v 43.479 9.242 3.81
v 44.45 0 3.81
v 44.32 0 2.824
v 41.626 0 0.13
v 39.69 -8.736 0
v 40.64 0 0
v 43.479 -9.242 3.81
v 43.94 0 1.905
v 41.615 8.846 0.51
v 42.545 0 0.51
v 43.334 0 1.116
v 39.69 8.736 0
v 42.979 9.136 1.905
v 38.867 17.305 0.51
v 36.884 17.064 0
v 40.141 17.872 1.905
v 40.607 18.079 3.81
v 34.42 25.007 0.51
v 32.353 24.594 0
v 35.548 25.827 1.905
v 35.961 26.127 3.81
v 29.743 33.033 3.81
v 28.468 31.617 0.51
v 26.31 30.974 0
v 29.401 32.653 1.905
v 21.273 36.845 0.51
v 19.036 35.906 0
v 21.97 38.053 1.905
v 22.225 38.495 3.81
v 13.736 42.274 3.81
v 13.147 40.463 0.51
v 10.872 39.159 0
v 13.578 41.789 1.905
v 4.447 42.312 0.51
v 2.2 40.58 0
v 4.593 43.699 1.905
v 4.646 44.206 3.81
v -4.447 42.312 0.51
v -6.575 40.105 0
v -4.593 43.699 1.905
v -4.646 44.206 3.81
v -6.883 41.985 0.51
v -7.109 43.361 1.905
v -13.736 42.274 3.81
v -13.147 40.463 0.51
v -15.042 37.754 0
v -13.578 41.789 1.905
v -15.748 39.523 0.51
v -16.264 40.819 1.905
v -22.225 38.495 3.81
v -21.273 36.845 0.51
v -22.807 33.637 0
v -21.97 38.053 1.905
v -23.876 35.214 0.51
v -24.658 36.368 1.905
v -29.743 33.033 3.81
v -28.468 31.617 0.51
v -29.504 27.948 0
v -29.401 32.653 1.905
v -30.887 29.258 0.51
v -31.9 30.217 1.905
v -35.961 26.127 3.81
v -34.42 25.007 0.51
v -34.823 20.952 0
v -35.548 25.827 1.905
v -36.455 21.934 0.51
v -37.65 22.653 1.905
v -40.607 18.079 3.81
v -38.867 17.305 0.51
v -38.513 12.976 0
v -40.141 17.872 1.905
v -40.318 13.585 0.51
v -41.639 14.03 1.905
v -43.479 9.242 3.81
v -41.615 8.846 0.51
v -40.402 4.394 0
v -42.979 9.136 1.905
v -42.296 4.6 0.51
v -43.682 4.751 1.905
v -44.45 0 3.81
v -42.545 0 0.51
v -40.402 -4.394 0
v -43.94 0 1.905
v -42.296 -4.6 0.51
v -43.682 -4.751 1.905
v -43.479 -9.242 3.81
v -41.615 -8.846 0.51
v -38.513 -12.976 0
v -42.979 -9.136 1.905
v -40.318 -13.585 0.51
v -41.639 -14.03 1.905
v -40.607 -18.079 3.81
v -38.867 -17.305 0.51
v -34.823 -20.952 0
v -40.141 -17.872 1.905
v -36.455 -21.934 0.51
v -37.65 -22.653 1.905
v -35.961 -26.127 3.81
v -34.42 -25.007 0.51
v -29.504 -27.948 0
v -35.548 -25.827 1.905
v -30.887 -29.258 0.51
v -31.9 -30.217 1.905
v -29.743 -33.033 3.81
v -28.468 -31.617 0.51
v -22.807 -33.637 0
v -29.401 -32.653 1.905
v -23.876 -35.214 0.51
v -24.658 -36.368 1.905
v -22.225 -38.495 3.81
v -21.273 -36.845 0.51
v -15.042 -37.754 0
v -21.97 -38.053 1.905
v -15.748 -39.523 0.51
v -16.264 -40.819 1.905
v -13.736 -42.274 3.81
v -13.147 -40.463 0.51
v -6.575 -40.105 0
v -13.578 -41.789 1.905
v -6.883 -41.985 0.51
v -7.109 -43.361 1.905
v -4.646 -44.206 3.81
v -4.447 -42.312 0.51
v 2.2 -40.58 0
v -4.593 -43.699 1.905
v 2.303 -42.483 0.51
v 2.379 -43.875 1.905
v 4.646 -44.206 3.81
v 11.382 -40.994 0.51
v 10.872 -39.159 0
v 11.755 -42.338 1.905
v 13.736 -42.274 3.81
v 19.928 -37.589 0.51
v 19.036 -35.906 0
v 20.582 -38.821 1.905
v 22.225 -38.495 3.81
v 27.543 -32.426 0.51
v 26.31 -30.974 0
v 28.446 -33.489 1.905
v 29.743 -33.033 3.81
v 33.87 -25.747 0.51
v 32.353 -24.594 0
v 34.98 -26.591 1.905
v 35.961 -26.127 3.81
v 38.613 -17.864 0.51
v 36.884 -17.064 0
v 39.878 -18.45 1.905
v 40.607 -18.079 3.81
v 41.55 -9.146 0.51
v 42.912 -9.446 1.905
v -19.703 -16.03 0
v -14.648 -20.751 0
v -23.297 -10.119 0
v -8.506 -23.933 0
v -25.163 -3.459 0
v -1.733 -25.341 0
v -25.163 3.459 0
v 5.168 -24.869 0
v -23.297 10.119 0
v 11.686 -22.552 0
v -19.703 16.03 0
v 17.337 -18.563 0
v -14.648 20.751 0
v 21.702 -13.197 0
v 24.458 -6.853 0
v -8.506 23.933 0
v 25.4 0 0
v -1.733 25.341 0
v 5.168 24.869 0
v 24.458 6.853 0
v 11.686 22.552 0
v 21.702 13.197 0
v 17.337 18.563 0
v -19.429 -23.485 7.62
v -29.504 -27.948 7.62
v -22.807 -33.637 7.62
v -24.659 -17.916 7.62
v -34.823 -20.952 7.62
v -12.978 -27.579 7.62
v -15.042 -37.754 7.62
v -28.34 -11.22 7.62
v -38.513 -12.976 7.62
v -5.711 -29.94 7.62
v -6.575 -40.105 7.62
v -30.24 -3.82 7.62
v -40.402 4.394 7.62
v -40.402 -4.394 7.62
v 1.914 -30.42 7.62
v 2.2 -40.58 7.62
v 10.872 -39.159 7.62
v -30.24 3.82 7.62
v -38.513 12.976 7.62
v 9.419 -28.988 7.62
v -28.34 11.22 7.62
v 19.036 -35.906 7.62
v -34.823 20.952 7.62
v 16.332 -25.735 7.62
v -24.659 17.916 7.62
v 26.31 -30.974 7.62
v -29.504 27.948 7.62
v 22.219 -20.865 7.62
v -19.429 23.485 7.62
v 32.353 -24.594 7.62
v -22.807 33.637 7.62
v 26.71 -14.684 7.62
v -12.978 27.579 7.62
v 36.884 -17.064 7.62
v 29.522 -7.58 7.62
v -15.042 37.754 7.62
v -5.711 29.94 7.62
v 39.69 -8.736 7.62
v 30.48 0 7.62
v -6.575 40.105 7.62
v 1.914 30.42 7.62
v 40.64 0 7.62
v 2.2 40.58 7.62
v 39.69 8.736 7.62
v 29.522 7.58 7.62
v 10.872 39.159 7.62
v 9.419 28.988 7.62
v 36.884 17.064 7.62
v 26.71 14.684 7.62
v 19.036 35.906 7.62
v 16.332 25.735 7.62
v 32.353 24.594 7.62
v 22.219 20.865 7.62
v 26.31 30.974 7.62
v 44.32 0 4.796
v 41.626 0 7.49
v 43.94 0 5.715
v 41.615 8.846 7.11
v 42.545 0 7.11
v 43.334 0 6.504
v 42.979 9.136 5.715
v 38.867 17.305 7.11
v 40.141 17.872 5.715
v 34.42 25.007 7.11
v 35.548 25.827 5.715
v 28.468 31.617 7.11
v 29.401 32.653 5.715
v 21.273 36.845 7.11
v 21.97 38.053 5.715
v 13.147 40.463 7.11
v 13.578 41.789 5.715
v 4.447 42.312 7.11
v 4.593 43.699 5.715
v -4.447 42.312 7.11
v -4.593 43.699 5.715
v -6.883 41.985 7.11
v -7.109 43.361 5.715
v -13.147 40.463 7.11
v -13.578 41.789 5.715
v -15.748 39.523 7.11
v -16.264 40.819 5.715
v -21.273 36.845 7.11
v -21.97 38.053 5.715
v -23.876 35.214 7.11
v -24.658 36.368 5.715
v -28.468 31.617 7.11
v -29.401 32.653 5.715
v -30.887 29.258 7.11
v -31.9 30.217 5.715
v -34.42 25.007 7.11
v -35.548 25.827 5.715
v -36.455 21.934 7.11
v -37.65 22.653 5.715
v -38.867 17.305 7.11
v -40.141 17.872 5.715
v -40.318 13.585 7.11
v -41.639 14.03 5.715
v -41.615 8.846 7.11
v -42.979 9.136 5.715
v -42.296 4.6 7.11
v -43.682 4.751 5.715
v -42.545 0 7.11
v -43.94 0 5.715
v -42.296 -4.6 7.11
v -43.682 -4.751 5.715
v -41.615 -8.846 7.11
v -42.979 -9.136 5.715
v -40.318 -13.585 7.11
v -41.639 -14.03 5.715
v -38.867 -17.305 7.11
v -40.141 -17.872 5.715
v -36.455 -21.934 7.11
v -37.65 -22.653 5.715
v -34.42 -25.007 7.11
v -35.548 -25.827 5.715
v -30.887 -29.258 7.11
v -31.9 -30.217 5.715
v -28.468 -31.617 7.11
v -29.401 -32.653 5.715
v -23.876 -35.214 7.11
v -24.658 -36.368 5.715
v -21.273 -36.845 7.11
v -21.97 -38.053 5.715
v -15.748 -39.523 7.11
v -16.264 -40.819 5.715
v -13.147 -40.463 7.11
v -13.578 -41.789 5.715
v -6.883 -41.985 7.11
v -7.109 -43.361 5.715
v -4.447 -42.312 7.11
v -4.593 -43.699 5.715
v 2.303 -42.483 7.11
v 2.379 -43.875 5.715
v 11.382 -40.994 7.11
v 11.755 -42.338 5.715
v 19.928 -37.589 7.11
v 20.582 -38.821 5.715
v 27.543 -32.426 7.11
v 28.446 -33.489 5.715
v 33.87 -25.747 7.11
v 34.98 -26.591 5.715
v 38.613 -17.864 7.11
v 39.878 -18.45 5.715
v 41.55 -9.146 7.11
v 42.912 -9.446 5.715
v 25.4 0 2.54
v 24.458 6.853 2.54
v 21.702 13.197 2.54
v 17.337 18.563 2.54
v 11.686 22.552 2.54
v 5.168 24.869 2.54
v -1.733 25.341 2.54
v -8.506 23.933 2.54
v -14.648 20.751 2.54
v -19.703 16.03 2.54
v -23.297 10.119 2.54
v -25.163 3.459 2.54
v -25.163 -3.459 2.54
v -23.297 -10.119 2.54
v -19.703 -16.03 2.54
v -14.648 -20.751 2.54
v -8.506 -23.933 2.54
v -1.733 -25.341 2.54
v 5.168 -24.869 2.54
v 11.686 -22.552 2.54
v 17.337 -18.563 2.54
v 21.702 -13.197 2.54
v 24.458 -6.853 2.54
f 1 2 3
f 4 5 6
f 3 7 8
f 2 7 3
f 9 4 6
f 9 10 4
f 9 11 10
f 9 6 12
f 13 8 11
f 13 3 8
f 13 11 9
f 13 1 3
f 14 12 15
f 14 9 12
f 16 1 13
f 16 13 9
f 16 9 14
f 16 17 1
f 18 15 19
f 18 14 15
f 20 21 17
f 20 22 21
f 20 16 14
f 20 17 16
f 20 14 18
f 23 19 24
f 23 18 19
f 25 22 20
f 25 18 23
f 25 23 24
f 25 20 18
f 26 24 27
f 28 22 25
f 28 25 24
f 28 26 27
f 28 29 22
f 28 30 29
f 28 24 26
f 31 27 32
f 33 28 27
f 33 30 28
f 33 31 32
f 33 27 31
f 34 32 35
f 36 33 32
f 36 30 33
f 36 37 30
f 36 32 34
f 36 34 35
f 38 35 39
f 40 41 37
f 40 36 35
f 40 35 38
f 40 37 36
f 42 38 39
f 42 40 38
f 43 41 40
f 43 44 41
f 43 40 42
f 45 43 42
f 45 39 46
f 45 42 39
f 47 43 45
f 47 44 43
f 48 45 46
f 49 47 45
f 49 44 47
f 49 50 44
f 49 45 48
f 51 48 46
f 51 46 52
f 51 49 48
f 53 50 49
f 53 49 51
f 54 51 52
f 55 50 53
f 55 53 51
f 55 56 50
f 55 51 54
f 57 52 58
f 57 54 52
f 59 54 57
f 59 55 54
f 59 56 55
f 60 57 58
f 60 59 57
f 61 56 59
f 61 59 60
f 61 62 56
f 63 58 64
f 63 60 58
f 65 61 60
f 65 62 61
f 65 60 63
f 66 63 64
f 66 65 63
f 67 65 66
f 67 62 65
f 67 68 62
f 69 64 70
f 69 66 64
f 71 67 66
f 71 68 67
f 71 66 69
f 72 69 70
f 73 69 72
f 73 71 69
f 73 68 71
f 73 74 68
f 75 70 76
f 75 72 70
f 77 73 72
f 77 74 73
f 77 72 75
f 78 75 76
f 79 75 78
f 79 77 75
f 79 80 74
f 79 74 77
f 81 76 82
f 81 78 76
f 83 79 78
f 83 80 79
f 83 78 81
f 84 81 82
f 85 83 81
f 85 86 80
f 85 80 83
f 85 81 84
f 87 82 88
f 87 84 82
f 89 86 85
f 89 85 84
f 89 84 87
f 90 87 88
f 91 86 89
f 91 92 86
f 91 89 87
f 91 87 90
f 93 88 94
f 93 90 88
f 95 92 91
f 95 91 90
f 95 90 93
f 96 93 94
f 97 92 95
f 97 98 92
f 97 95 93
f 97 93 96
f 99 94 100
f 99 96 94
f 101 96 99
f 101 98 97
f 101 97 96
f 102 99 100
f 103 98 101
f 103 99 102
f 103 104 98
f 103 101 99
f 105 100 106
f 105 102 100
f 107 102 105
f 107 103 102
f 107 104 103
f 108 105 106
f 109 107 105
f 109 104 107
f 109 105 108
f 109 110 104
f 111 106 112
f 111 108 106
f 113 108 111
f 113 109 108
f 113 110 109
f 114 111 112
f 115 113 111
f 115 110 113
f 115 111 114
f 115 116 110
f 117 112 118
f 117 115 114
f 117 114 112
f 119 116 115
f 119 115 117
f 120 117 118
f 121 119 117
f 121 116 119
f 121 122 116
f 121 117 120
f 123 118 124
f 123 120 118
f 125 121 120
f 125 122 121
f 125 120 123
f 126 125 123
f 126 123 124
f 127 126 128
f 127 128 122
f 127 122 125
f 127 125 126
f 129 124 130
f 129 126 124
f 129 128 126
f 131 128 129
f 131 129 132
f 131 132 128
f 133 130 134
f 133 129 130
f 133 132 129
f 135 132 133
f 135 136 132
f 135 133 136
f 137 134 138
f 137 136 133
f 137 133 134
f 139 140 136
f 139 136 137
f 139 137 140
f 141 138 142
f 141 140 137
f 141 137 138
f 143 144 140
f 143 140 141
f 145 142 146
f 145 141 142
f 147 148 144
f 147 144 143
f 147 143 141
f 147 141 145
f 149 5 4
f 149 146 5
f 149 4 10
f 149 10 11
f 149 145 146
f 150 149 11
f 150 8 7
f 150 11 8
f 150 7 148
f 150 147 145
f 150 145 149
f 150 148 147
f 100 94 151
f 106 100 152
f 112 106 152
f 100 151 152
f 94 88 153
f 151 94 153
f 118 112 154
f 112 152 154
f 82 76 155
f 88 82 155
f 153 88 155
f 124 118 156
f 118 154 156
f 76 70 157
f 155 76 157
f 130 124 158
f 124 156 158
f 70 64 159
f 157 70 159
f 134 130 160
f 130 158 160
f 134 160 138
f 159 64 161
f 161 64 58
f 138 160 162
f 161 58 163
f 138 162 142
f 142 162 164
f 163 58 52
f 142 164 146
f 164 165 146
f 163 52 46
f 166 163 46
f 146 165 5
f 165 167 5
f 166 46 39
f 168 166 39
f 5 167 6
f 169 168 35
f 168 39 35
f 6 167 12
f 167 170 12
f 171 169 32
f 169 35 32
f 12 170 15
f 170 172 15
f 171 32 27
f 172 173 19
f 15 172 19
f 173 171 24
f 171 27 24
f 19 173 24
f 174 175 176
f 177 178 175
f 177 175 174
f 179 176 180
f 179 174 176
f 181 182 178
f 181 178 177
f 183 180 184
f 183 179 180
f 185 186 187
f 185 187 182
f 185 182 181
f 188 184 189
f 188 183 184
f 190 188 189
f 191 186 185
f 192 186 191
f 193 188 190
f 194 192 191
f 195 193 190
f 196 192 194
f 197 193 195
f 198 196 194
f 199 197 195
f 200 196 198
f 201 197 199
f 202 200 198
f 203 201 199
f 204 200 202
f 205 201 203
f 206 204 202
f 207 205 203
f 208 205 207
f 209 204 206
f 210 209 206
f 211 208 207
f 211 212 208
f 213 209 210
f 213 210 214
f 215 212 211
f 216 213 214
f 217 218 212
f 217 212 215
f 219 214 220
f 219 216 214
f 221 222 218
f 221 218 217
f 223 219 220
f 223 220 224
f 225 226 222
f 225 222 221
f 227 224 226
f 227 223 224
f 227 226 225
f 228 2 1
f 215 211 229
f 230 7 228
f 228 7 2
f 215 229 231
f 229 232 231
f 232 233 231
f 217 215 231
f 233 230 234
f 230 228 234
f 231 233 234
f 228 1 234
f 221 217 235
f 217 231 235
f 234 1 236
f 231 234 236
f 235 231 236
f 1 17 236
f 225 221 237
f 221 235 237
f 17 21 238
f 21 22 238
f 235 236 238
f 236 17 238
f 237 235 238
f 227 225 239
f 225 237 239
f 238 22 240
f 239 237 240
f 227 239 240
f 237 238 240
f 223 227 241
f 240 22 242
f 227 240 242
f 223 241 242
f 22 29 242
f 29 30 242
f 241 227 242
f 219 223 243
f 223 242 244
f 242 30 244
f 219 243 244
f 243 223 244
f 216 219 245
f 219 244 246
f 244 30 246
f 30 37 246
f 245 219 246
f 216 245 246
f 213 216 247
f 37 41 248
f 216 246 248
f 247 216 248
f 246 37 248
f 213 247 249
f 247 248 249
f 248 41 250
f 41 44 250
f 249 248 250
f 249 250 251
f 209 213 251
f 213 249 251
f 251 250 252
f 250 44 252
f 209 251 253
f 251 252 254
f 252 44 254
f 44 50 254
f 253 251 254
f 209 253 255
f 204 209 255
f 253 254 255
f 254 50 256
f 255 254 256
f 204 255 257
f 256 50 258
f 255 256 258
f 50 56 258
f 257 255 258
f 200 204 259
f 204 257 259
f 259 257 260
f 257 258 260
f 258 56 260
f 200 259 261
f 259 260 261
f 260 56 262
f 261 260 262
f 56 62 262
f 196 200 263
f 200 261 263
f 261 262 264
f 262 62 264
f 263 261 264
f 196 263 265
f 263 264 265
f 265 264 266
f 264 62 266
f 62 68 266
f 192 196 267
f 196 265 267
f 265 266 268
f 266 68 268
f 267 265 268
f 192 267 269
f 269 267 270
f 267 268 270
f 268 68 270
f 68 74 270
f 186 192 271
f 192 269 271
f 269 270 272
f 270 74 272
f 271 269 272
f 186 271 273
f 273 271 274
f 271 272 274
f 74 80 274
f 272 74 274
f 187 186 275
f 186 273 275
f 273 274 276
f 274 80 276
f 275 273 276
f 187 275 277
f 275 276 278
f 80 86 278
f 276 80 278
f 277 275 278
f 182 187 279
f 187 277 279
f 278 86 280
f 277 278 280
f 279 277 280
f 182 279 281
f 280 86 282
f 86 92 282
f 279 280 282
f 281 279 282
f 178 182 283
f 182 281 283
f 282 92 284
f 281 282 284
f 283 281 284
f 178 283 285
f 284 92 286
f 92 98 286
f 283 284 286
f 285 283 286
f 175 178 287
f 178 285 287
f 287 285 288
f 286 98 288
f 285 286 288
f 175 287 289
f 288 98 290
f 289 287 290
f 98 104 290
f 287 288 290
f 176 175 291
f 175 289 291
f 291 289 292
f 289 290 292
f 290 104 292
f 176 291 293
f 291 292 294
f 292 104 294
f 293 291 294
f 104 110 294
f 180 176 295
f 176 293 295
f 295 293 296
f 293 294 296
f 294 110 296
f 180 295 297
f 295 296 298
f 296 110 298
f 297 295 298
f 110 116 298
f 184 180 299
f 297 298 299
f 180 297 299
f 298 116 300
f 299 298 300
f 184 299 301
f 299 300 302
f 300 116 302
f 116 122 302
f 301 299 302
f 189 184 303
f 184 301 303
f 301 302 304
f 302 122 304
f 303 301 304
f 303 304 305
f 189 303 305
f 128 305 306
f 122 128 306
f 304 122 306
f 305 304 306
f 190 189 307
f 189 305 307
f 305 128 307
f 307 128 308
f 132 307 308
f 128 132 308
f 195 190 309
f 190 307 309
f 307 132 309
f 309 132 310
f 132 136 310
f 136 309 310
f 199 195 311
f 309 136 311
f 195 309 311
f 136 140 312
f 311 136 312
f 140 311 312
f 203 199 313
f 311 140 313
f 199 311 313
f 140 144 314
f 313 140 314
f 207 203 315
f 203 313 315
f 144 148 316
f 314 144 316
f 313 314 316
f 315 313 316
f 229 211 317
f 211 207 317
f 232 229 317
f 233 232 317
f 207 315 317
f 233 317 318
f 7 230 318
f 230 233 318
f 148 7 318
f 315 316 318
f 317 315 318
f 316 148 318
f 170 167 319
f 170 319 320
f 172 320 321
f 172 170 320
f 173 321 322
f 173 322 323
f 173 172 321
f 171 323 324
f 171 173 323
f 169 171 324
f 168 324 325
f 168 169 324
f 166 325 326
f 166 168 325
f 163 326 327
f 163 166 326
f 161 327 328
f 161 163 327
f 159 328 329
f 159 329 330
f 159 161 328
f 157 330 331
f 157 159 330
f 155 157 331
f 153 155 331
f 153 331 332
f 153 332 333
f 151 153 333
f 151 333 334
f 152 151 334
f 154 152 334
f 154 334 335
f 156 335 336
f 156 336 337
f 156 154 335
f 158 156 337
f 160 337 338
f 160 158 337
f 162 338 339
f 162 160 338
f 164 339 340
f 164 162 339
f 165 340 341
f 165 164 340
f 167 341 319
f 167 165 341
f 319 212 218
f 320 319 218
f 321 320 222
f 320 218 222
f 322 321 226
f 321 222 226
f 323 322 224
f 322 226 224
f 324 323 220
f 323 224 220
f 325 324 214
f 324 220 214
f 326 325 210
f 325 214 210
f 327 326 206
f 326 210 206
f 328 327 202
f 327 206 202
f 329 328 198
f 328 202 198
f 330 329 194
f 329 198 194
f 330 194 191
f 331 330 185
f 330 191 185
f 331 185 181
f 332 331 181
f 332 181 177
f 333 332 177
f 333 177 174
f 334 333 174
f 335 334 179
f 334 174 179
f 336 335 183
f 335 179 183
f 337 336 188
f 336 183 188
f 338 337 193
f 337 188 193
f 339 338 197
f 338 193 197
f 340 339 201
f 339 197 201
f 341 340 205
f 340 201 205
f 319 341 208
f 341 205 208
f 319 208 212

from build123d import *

# Parameters (mm, degrees)
F0_R     = 44.45
F0_R_2   = 25.4
F1_DEPTH = 7.62
F2_SIZE  = 5.08
F3_R     = 3.80999


# Not quite as in the source:
# - a fillet or chamfer is up to 0.001 mm smaller than in the source, because OpenCascade refuses the exact size


with BuildPart() as f1:
    # F0 (on Top) → F1 (new body)
    with BuildSketch(Plane.XY):
        Circle(F0_R)
        Circle(F0_R_2, mode=Mode.SUBTRACT)
    extrude(amount=F1_DEPTH)

    # F2
    f2_edges = [f1.edges().sort_by_distance(p)[0] for p in [
        (-25.4, 0, 7.62),
    ]]
    chamfer(f2_edges, length=F2_SIZE)

    # F3 (radius 3.81 in the source; OpenCascade refuses exactly that, so slightly less here)
    f3_edges = [f1.edges().sort_by_distance(p)[0] for p in [
        (44.45, 0, 3.81),
        (-44.45, 0, 0),
        (-44.45, 0, 7.62),
    ]]
    fillet(f3_edges, radius=F3_R)


solid = f1.part
